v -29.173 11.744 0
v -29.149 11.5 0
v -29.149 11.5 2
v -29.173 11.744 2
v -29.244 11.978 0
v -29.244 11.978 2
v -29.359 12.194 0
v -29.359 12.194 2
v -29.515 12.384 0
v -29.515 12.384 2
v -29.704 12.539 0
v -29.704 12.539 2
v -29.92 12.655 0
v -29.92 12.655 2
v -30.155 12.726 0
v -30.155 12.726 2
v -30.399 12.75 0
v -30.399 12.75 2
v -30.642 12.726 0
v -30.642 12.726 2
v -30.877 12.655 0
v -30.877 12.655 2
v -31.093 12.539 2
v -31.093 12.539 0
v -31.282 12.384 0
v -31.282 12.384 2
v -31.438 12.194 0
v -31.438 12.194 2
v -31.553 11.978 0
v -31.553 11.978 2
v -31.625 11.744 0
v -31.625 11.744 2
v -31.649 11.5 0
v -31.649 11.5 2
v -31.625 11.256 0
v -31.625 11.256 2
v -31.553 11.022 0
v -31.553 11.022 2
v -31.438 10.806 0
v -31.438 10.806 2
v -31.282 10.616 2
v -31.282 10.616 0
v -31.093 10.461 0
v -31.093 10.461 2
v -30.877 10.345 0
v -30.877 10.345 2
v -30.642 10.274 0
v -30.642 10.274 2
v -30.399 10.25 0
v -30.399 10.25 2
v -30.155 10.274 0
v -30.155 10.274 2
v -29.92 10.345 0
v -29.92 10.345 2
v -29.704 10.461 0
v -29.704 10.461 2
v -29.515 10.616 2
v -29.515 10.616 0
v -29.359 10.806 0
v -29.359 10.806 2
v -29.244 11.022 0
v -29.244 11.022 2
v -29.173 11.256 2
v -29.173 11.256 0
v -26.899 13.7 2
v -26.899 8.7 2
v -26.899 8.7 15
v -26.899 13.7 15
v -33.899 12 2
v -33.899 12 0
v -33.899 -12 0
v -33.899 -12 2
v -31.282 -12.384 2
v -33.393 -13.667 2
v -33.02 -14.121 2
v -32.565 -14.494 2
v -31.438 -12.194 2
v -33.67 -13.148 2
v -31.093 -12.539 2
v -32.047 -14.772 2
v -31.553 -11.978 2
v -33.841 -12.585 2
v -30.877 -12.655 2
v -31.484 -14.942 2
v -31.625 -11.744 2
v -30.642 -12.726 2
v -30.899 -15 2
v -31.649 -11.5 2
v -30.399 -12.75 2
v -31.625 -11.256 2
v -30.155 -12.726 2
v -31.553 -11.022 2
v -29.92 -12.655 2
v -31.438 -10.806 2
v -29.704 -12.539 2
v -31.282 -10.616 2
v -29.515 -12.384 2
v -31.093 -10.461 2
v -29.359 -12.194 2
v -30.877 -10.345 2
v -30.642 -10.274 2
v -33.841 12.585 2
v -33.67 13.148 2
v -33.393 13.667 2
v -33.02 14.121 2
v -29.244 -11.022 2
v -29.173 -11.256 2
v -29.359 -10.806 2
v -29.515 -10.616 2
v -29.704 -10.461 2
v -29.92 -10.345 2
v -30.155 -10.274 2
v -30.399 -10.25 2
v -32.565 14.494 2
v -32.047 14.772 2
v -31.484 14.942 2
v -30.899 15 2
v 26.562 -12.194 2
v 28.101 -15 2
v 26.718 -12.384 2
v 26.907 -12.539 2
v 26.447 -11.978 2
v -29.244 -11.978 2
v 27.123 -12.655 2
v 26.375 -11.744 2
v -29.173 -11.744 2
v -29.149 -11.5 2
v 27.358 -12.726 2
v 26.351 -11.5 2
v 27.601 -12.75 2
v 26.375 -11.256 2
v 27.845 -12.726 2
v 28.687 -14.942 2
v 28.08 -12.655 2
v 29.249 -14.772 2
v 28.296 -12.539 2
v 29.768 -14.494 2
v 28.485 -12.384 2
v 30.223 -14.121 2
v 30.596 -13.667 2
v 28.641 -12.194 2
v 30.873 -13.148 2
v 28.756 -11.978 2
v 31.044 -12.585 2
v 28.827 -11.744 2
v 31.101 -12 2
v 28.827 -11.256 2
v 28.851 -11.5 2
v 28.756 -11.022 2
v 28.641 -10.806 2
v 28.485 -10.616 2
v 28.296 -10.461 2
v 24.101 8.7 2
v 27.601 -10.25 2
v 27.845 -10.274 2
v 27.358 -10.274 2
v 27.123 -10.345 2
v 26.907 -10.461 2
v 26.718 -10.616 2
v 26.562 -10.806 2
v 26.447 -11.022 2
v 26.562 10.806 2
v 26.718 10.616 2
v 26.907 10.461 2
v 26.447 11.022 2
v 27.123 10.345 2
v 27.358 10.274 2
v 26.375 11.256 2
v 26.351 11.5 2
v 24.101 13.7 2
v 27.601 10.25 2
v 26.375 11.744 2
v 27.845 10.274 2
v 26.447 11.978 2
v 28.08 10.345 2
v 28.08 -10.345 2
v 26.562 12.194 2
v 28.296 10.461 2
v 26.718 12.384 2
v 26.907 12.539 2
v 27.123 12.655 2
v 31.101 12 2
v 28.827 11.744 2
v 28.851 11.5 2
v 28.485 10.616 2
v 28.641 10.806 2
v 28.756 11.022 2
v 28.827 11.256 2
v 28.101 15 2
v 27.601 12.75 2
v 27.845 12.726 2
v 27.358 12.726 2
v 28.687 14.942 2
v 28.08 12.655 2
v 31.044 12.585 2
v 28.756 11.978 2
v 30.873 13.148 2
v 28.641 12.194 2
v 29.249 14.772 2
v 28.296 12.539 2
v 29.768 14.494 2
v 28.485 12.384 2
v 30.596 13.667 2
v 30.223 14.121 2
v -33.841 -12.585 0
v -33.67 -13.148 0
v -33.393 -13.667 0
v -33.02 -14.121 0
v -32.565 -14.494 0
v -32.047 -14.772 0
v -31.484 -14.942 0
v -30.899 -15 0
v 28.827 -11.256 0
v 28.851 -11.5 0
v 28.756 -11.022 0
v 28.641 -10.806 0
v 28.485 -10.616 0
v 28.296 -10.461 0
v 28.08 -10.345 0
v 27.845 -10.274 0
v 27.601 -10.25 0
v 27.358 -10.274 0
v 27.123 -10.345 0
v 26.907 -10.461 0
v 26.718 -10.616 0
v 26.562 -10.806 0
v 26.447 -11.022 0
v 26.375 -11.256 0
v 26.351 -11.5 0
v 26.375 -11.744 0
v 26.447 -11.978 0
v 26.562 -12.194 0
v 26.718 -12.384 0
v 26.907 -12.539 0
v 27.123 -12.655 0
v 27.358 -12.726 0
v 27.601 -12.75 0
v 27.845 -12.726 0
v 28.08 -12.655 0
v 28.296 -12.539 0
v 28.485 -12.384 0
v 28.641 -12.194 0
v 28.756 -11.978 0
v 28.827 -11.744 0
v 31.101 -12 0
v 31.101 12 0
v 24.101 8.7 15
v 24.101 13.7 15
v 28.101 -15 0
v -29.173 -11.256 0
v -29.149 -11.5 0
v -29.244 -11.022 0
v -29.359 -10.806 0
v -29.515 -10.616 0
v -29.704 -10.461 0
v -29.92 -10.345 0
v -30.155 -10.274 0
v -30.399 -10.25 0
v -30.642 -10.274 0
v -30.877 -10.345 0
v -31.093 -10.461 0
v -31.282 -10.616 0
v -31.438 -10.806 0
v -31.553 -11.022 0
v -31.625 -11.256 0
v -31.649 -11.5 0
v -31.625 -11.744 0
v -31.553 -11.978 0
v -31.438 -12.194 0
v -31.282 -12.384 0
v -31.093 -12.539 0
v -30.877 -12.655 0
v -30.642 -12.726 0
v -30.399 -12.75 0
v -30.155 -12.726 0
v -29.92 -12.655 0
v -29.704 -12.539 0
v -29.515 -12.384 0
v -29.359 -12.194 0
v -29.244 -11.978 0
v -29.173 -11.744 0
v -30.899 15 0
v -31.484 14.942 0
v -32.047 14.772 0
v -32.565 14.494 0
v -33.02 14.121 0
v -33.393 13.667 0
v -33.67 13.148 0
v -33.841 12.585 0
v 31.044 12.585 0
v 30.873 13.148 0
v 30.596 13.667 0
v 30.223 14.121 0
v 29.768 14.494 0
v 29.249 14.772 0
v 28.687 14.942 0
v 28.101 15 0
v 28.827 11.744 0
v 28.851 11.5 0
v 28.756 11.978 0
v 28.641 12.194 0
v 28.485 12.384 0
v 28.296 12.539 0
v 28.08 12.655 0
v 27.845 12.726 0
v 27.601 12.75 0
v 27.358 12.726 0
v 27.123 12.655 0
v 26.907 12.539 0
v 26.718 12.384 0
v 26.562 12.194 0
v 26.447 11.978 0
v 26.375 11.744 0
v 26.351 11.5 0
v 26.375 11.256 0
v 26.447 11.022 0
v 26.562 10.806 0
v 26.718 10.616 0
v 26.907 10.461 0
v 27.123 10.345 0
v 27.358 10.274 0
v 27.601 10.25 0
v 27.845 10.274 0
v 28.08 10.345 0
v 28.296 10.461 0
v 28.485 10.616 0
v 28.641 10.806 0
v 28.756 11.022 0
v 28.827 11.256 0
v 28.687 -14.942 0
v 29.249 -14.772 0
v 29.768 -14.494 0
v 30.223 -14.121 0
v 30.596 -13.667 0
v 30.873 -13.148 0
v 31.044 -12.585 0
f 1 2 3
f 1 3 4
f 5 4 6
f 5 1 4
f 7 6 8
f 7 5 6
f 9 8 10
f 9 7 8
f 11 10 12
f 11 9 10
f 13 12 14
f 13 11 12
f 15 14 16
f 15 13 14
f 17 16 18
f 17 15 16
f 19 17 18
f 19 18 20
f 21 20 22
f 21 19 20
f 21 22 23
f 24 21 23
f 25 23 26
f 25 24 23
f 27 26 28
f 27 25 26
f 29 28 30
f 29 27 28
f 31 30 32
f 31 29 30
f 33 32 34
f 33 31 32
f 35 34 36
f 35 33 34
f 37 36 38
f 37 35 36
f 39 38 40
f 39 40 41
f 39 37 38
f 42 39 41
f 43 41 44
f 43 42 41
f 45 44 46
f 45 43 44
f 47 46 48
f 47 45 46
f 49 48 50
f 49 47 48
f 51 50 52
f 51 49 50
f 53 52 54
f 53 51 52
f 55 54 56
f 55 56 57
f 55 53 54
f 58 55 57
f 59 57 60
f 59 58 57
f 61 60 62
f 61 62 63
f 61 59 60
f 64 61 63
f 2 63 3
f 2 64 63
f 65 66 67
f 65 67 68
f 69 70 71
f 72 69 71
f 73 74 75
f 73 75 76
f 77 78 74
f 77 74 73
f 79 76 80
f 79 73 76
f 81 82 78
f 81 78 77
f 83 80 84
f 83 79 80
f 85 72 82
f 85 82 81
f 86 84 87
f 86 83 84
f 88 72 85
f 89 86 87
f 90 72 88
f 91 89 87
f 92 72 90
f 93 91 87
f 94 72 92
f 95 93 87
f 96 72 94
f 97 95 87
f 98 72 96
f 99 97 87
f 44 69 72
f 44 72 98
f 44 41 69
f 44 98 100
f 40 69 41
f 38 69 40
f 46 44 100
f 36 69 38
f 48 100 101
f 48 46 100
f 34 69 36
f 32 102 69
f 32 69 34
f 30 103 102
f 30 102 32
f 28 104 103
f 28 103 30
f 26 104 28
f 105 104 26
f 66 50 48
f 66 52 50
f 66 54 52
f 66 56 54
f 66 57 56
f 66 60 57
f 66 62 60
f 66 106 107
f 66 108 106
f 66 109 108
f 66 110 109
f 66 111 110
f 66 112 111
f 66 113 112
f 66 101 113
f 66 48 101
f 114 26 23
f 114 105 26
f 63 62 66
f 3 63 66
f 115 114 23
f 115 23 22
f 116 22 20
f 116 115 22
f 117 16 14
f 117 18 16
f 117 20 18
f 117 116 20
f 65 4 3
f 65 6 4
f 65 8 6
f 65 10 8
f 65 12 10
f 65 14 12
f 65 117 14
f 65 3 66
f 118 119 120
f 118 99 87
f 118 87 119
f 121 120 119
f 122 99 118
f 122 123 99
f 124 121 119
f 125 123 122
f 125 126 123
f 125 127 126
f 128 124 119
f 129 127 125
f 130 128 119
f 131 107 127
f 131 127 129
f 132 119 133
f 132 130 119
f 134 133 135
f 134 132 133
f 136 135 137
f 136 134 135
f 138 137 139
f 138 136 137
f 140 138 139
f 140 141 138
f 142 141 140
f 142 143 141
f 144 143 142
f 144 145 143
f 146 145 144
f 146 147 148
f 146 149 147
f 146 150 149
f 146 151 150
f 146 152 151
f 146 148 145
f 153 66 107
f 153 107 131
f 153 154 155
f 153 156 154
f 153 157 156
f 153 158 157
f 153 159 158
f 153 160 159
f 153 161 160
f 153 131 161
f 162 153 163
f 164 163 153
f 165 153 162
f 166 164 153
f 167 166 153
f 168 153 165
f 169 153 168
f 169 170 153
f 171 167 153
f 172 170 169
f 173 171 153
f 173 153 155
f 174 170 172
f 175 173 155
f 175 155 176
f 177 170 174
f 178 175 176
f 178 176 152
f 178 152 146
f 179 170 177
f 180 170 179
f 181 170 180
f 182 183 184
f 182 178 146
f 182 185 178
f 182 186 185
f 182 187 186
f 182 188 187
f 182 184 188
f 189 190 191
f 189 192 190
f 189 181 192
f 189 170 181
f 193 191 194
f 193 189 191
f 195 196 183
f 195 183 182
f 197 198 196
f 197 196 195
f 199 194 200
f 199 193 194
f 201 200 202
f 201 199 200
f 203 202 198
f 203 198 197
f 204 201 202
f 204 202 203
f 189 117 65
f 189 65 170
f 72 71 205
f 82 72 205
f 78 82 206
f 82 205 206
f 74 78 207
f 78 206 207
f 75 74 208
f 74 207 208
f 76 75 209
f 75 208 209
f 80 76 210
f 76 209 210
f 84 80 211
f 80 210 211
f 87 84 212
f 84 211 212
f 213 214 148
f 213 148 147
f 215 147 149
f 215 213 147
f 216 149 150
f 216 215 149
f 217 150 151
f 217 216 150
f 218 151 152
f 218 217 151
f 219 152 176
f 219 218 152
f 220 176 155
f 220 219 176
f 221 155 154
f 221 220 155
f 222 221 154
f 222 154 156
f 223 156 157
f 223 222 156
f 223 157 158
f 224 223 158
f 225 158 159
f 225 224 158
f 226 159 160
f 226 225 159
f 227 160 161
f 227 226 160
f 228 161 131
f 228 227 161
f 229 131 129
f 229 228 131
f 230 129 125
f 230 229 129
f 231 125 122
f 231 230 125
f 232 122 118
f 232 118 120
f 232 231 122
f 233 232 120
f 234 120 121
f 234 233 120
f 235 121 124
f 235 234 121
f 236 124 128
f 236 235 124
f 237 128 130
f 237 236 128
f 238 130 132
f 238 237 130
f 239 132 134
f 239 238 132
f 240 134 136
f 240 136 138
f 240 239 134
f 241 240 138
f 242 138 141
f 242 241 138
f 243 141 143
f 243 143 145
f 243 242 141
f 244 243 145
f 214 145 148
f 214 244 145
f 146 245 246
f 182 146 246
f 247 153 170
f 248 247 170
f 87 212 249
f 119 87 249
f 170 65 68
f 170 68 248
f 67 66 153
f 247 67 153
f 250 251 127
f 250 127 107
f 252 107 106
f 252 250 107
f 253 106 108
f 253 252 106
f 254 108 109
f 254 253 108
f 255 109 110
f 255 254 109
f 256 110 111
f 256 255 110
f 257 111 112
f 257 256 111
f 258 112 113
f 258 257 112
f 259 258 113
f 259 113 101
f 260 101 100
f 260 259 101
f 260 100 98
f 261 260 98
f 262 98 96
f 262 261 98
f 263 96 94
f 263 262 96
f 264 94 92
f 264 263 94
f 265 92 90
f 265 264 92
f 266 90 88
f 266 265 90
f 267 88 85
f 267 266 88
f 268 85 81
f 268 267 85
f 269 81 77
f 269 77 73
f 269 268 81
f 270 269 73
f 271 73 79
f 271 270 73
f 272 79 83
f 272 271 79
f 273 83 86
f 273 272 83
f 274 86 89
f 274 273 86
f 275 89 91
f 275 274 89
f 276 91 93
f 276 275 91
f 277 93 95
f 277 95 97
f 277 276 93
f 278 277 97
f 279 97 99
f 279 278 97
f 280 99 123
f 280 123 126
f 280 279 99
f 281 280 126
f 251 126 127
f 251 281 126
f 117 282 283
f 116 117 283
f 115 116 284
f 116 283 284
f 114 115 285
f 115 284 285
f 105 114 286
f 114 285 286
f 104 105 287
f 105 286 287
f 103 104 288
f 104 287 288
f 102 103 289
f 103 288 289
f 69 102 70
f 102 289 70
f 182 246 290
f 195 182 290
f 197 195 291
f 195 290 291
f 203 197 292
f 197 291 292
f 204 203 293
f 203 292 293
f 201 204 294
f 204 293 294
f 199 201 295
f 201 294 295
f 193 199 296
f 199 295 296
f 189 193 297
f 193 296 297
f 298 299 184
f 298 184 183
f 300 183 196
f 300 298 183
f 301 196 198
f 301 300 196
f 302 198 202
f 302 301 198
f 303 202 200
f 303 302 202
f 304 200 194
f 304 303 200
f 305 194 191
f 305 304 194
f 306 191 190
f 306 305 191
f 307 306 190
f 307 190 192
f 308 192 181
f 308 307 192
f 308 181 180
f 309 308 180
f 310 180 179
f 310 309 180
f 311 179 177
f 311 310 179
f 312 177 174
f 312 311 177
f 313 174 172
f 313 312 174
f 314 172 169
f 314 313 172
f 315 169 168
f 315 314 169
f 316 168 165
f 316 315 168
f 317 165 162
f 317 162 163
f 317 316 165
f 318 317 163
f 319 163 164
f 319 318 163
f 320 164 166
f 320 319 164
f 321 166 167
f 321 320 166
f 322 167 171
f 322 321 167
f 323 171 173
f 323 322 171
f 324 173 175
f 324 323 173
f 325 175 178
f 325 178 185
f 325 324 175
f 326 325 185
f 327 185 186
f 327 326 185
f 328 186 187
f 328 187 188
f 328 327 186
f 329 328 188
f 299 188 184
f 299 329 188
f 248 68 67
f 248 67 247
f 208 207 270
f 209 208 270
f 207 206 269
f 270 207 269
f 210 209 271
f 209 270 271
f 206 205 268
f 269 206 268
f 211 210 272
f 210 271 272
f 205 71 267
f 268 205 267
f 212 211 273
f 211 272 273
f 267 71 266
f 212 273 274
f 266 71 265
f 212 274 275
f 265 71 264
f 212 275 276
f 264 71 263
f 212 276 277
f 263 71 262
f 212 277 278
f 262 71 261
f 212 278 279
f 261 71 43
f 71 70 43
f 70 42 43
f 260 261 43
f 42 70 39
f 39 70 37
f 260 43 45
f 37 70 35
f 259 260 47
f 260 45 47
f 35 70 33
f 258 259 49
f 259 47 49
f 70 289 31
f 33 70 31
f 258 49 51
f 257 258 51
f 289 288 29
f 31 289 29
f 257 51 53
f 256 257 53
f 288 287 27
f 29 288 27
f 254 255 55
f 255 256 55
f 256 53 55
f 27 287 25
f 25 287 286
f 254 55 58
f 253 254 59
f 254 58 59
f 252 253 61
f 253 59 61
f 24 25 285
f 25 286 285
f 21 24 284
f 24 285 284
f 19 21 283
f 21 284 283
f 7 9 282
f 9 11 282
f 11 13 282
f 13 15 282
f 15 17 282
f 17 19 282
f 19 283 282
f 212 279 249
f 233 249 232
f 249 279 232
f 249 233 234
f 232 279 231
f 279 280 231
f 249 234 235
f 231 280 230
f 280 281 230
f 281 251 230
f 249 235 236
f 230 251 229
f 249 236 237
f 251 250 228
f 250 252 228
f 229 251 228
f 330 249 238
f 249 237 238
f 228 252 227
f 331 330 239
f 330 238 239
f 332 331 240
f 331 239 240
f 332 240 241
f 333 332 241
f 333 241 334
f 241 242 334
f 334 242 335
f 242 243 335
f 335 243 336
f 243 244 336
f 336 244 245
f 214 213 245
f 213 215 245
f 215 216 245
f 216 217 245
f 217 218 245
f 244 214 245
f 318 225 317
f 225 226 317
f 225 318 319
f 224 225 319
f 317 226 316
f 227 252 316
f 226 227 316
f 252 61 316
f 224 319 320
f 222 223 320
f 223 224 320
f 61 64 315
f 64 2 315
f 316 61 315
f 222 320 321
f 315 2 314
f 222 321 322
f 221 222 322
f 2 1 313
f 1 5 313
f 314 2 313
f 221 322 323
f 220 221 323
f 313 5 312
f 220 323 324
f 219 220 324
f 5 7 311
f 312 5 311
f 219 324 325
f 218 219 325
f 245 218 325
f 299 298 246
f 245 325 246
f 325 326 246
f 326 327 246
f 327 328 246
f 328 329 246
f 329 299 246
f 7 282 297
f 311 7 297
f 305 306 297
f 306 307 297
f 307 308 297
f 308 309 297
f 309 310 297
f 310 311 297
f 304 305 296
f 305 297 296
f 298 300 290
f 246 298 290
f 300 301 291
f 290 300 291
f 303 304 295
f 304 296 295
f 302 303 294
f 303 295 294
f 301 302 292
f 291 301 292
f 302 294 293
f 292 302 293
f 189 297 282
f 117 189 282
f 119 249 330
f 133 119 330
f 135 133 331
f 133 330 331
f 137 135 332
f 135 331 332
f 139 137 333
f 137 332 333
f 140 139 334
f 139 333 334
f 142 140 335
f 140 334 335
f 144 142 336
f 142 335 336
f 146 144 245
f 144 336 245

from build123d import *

# Parameters (mm, degrees)
F0_R     = 1.25
F0_W     = 51
F0_H     = 5
F1_DEPTH = 2
F2_DEPTH = 15


with BuildPart() as f1:
    # F0 (on Top) → F1 (new body)
    with BuildSketch(Plane.XY):
        with BuildLine():
            ThreePointArc((31.101435, 12), (30.222755, 14.12132), (28.101435, 15))
            Line((28.101435, 15), (-30.898565, 15))
            ThreePointArc((-30.898565, 15), (-33.019886, 14.12132), (-33.898565, 12))
            Line((-33.898565, 12), (-33.898565, -12))
            ThreePointArc((-33.898565, -12), (-33.019886, -14.12132), (-30.898565, -15))
            Line((-30.898565, -15), (28.101435, -15))
            ThreePointArc((28.101435, -15), (30.222755, -14.12132), (31.101435, -12))
            Line((31.101435, -12), (31.101435, 12))
        make_face()
        with Locations((-30.398565, -11.5)):
            Circle(F0_R, mode=Mode.SUBTRACT)
        with Locations((27.601435, -11.5)):
            Circle(F0_R, mode=Mode.SUBTRACT)
        with Locations((-30.398565, 11.5)):
            Circle(F0_R, mode=Mode.SUBTRACT)
        with Locations((-1.398565, 11.2)):
            Rectangle(F0_W, F0_H, mode=Mode.SUBTRACT)
        with Locations((27.601435, 11.5)):
            Circle(F0_R, mode=Mode.SUBTRACT)
        with Locations((-1.398565, 11.2)):
            Rectangle(F0_W, F0_H)
    extrude(amount=F1_DEPTH)

    # F0 (on Top) → F2 (join)
    with BuildSketch(Plane.XY):
        with Locations((-1.398565, 11.2)):
            Rectangle(F0_W, F0_H)
    extrude(amount=F2_DEPTH)


solid = f1.part
